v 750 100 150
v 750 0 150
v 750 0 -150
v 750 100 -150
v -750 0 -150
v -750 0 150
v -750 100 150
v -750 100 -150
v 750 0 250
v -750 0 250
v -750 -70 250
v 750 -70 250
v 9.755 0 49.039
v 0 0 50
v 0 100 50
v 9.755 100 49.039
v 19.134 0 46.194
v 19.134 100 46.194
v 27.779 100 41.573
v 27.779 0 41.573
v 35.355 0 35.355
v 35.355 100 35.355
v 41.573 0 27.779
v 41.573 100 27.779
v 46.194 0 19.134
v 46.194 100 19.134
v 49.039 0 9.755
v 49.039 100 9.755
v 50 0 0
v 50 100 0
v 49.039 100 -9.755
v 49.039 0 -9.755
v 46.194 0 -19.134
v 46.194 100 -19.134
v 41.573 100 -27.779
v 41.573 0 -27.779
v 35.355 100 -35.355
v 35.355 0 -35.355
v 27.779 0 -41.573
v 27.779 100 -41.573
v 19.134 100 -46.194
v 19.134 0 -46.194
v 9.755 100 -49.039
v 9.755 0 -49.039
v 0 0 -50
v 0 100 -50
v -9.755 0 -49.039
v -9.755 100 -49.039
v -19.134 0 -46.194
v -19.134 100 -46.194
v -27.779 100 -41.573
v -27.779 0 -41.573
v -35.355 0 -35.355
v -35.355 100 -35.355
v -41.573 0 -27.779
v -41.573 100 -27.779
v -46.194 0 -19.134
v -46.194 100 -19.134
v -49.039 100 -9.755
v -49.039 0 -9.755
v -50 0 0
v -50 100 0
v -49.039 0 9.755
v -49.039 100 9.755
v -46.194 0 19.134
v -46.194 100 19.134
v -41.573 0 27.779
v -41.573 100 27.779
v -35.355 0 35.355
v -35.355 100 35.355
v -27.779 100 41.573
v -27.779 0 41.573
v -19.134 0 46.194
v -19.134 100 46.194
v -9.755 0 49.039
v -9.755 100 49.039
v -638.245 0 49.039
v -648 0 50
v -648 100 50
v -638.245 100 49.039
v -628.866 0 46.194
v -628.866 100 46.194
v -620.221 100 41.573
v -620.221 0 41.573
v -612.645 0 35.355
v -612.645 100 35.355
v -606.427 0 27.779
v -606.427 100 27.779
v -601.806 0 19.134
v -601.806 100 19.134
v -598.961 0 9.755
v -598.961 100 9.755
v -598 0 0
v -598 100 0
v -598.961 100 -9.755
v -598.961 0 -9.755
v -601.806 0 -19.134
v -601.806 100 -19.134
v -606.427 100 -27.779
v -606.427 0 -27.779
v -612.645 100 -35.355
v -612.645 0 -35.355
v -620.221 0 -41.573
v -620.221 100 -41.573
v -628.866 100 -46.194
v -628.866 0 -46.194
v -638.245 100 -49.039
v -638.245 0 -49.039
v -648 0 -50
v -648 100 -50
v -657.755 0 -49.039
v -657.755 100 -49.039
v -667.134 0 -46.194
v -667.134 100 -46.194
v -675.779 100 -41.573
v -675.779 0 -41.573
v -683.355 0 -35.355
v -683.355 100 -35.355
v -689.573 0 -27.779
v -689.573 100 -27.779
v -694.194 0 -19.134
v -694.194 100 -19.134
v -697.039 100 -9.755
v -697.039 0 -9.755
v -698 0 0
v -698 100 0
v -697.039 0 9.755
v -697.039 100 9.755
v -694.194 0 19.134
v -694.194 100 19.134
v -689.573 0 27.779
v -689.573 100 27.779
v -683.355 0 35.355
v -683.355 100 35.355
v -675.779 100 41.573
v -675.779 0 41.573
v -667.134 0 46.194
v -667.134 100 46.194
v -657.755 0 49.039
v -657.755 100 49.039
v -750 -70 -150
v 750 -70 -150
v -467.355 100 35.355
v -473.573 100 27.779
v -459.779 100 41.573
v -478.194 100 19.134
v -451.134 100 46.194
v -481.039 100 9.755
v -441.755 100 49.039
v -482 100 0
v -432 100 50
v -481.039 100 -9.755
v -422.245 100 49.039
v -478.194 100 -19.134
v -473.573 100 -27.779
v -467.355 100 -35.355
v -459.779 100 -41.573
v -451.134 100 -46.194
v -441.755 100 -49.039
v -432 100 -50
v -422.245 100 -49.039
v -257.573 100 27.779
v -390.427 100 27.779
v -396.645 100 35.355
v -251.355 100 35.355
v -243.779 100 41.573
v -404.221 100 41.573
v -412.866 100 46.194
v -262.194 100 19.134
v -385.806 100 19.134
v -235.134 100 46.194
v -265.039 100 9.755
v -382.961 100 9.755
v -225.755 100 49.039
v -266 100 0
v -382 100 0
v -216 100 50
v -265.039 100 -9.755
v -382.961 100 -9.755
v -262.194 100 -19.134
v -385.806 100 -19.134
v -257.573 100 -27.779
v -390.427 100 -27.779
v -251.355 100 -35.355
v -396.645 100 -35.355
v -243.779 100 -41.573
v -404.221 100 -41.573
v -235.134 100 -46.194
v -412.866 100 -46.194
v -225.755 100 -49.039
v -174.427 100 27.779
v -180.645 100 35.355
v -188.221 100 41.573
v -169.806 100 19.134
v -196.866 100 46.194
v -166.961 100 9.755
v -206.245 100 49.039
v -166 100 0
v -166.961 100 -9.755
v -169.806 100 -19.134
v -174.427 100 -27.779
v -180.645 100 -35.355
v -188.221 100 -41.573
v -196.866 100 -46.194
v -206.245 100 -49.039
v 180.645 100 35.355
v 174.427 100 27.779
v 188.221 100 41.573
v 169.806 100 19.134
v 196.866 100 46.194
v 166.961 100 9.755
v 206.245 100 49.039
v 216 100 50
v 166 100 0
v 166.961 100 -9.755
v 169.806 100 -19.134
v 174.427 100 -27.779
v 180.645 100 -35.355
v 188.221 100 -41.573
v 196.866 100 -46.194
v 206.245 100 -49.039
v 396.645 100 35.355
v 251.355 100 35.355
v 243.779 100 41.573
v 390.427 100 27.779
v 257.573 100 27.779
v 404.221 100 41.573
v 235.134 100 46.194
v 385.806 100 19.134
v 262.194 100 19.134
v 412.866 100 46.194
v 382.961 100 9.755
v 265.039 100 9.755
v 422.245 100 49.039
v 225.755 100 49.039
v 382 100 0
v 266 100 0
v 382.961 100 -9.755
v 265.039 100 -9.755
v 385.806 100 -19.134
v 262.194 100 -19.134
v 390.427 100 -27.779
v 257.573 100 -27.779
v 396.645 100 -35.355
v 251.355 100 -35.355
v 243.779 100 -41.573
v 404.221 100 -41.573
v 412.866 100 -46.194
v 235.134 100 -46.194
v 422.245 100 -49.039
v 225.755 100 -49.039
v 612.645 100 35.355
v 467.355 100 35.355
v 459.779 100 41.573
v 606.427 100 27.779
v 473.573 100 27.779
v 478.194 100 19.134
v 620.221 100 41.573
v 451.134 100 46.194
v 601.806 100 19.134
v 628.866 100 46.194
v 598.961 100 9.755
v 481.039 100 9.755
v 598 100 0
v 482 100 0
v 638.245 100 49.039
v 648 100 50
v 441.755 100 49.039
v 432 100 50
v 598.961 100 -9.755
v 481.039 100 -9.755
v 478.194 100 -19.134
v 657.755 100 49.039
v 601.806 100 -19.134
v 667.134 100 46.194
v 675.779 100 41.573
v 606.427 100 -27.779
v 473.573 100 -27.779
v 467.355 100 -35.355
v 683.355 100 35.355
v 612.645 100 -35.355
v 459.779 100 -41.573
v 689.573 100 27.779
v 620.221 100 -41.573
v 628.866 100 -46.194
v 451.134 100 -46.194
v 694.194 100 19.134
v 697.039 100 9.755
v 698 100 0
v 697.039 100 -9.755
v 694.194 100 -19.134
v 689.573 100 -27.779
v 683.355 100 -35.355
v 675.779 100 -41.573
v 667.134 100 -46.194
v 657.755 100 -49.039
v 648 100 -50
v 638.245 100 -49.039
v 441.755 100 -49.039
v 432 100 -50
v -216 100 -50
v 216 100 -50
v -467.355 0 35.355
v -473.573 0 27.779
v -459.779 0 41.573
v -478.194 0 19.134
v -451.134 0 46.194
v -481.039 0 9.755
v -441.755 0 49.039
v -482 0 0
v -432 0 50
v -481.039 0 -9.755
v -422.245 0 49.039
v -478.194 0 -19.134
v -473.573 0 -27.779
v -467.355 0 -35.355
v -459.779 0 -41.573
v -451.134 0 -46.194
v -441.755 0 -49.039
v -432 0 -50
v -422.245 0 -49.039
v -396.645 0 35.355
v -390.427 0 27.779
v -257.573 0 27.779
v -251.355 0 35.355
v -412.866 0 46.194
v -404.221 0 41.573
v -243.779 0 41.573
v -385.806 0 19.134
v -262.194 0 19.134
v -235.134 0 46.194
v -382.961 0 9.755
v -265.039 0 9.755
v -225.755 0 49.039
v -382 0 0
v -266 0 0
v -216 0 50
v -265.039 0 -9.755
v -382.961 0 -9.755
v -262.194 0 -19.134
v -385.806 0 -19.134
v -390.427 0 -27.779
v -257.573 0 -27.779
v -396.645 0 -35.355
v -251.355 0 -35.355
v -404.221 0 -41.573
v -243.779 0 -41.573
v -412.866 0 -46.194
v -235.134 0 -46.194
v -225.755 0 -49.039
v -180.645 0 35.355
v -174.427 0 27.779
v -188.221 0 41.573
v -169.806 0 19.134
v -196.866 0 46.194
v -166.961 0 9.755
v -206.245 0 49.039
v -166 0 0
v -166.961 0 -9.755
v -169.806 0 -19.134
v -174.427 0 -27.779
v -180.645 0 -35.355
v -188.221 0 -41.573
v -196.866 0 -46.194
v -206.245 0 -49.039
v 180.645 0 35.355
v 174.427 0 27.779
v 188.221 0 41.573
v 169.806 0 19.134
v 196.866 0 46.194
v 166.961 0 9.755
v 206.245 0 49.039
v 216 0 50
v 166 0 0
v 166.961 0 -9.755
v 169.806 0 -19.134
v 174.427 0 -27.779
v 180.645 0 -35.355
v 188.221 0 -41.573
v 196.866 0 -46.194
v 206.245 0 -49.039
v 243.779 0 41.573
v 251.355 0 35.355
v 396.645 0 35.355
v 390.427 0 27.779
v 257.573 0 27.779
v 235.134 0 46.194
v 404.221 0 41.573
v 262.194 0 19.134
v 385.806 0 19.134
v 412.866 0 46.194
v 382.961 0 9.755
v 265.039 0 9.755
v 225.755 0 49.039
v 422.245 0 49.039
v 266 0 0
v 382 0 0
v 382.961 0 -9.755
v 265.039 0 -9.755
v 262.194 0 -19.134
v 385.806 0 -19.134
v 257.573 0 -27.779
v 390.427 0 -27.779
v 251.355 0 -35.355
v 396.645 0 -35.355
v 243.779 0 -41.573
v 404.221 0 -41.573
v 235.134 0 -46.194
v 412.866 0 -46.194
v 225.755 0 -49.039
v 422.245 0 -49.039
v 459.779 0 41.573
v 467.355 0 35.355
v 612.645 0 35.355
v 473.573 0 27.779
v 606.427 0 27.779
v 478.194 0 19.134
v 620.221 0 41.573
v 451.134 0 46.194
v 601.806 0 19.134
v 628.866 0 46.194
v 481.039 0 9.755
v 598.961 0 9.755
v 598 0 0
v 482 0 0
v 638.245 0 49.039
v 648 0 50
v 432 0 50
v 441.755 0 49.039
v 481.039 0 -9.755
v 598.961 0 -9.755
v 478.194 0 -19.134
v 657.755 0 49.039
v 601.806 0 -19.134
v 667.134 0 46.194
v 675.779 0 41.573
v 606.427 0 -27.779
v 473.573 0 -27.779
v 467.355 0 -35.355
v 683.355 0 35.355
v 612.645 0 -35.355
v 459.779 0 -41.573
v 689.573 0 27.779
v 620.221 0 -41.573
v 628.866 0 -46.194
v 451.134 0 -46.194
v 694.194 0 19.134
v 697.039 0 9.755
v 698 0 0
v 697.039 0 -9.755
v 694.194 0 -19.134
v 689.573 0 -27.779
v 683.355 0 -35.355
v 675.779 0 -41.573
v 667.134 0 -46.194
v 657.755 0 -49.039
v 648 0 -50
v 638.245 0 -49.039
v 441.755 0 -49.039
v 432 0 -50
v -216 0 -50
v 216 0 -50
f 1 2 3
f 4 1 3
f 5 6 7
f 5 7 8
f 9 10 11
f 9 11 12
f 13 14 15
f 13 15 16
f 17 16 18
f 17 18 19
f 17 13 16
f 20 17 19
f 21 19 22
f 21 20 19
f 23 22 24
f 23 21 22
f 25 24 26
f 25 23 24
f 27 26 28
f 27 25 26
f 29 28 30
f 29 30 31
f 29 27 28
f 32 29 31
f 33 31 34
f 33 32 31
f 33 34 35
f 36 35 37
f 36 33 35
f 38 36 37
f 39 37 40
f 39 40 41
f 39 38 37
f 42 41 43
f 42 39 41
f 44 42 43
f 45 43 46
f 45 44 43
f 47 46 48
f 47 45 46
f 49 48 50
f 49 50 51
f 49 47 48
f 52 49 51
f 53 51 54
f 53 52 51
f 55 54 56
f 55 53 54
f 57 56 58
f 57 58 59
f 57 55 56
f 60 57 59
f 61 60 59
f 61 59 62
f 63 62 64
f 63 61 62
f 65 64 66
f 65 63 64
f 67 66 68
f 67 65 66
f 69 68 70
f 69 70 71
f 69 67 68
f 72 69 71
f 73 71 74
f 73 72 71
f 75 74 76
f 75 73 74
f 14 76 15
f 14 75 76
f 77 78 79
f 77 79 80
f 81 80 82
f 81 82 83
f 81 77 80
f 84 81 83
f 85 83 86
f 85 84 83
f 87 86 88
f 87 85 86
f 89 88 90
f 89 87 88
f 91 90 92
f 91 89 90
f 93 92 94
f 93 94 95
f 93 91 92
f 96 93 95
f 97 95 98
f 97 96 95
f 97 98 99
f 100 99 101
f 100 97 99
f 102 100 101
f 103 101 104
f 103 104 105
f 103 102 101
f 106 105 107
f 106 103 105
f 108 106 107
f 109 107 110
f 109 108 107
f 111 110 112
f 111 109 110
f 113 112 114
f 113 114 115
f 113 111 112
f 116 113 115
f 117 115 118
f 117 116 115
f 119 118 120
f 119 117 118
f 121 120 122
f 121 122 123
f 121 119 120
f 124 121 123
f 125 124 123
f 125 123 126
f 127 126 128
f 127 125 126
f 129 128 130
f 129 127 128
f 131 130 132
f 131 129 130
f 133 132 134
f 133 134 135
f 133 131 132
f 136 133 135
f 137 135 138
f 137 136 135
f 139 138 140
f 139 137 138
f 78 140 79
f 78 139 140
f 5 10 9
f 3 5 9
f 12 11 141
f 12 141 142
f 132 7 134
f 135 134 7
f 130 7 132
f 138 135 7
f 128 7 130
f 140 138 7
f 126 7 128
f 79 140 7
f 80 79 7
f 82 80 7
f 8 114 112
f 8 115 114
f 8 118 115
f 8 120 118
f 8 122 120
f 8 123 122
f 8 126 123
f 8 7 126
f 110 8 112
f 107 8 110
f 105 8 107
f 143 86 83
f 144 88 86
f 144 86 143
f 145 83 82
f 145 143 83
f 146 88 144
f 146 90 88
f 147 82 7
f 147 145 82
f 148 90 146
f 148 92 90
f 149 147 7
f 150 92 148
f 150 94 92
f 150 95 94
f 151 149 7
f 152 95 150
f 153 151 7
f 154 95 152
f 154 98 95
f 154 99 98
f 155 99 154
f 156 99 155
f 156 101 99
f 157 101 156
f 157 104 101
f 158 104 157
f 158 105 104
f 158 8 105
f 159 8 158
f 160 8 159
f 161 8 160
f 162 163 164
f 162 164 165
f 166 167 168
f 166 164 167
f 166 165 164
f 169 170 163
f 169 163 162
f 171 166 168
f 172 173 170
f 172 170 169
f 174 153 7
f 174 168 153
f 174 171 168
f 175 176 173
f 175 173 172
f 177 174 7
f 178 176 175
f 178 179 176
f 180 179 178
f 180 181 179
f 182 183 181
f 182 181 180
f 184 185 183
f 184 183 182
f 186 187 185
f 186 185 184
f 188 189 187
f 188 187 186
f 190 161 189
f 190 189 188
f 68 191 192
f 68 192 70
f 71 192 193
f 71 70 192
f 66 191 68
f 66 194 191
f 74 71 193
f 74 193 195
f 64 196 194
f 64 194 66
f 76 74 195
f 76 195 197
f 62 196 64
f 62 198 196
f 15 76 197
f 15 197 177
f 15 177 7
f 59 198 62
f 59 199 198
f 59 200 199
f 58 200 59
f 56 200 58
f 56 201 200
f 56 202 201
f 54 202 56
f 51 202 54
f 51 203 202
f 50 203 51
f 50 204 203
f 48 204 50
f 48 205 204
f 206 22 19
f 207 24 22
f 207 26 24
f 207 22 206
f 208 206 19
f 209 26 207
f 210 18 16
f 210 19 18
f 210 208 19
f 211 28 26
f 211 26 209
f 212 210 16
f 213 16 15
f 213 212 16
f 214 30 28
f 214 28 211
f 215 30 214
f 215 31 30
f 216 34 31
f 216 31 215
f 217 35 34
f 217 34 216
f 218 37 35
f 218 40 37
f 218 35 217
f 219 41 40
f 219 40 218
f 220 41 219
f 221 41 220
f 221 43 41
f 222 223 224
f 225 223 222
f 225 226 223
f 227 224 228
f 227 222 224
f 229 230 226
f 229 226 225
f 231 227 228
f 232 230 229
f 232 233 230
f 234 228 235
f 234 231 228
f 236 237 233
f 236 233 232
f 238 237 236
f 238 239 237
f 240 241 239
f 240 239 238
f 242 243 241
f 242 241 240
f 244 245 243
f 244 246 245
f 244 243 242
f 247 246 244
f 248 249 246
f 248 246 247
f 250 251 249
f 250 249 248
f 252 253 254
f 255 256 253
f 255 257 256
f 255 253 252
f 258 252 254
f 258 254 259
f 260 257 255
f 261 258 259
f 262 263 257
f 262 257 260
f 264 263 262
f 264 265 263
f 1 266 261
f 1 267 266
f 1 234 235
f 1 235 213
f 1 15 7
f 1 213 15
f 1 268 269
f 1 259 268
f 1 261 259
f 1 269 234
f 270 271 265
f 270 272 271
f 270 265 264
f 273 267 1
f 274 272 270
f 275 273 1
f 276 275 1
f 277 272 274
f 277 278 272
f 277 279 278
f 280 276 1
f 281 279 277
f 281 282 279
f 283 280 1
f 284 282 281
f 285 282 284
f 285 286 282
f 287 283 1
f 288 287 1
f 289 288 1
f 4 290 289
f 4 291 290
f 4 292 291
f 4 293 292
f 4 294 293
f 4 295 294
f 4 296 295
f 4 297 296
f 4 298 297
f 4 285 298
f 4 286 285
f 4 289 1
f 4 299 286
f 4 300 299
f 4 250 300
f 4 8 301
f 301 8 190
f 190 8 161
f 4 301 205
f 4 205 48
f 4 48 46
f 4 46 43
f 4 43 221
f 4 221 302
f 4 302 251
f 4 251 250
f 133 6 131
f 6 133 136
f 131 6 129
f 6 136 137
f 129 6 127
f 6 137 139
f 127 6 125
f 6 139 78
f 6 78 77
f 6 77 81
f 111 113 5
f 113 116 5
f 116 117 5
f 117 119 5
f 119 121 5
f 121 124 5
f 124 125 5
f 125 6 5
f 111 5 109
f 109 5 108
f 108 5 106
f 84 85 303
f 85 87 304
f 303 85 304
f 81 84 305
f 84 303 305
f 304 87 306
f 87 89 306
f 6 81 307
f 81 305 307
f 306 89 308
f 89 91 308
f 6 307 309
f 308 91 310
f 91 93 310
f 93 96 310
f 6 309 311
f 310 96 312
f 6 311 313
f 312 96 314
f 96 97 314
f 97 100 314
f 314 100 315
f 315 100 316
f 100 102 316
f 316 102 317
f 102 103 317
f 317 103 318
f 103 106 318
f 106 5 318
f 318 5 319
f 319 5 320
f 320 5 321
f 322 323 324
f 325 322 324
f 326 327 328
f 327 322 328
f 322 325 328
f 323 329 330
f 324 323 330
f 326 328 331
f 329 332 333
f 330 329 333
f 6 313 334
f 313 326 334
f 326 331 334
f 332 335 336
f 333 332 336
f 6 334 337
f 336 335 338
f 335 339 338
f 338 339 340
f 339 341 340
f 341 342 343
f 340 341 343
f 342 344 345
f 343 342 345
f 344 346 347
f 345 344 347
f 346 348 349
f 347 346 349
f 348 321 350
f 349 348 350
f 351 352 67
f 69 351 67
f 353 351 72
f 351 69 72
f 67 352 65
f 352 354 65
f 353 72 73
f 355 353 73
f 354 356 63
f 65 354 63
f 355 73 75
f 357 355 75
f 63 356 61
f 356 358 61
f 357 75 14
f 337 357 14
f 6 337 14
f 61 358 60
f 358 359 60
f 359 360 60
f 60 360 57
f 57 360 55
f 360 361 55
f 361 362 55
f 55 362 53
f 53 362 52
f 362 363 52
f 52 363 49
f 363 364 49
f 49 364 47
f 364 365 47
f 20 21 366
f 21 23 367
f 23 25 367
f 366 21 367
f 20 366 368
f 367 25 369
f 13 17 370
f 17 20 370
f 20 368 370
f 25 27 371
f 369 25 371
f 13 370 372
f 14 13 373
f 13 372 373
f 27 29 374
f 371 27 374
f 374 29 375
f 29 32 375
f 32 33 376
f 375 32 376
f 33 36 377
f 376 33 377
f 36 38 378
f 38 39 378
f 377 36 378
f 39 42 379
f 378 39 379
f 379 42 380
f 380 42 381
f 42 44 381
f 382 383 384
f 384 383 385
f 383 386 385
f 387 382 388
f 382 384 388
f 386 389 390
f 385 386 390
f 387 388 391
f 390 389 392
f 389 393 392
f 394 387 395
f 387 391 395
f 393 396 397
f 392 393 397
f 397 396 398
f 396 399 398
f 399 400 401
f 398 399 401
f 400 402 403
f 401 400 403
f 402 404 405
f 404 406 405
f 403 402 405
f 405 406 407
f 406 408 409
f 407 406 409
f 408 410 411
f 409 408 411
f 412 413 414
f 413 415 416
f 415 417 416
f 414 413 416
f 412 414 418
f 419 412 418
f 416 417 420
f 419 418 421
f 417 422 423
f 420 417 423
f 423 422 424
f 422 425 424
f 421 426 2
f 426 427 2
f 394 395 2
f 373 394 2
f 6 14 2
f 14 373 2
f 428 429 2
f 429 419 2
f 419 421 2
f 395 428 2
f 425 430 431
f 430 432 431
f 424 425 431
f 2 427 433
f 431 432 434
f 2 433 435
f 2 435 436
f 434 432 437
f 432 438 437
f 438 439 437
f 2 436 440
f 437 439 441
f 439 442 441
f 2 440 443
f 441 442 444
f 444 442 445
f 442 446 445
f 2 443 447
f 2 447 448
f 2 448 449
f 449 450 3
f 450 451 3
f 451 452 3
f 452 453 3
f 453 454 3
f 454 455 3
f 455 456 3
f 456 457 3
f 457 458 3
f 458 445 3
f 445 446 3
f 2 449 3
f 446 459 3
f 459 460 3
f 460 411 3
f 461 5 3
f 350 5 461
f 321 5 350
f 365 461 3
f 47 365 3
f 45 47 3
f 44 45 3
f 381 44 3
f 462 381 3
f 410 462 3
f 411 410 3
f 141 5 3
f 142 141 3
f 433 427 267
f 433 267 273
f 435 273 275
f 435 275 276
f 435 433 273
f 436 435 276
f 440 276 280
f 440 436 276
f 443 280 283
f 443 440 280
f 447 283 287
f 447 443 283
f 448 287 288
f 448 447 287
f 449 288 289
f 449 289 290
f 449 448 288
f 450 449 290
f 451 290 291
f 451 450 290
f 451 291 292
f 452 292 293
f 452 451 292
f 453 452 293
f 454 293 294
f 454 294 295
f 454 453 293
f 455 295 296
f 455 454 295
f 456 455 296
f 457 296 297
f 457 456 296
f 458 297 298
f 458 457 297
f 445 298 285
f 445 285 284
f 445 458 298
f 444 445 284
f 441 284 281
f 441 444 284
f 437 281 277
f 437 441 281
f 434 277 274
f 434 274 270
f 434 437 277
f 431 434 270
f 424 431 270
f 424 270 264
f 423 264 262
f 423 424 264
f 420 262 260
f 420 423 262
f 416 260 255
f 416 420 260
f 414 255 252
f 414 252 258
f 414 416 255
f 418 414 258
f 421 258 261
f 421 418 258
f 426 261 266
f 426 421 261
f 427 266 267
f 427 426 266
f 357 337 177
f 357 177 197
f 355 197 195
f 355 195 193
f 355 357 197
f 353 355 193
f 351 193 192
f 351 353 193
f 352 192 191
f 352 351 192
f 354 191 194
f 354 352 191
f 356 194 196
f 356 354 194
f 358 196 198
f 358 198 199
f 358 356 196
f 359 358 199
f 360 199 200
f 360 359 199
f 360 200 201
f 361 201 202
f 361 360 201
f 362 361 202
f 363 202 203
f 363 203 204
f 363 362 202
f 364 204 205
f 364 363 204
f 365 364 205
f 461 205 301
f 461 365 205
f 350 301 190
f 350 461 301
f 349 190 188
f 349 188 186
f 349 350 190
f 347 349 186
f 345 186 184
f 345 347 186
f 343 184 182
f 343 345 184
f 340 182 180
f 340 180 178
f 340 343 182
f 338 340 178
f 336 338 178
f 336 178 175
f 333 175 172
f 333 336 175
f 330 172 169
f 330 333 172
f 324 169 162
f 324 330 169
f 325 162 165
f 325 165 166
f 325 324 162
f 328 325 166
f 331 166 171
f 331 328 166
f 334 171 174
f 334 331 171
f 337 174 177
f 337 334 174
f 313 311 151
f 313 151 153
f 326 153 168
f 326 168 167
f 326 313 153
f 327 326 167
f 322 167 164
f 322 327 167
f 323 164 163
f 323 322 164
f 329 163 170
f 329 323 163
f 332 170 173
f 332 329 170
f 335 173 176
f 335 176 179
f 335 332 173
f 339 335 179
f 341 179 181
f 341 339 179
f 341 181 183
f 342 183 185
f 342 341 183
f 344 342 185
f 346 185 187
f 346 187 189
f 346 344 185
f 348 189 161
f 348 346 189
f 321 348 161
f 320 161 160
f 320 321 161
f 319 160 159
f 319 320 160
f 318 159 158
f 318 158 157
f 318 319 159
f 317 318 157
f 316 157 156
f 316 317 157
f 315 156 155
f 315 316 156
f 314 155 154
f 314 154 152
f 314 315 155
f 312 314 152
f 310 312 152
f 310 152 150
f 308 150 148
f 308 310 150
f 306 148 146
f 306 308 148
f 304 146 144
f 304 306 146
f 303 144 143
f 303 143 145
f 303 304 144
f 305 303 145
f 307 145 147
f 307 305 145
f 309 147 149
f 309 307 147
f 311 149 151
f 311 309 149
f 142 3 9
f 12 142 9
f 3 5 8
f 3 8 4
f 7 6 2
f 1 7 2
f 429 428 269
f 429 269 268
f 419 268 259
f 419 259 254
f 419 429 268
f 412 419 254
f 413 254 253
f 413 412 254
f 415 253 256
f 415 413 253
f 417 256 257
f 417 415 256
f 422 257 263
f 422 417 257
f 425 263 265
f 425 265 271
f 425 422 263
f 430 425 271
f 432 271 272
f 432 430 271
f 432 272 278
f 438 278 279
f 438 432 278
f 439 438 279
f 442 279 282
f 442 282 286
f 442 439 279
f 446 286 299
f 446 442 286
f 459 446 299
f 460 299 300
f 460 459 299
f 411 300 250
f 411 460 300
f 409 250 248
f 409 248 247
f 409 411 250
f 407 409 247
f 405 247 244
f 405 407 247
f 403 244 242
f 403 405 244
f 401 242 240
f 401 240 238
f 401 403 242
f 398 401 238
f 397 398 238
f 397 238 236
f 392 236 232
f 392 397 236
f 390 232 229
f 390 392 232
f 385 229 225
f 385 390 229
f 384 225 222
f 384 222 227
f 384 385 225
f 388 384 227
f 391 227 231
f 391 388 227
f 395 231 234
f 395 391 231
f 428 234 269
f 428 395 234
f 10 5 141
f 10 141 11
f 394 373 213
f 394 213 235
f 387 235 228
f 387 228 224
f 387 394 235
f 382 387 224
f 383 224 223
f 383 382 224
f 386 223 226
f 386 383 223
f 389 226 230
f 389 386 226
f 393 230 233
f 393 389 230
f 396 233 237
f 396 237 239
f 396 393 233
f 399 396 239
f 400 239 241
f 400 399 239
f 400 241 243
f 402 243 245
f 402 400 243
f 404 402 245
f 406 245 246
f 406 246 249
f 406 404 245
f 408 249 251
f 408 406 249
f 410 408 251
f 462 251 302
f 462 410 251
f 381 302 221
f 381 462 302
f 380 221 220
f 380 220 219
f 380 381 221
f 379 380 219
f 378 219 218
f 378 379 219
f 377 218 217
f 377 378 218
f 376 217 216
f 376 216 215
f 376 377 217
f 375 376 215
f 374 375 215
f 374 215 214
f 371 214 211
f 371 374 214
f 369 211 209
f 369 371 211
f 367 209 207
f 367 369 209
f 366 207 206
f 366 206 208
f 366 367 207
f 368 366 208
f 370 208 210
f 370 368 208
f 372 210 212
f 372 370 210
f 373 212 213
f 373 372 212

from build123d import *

# Parameters (mm, degrees)
SKETCH1_W           = 1500
SKETCH1_H           = 300
SKETCH1_R           = 50
BOSS_EXTRUDE1_DEPTH = 100
SKETCH2_W           = 1500
SKETCH2_H           = 400
BOSS_EXTRUDE3_DEPTH = 70


with BuildPart() as part:
    # Sketch1 → Boss-Extrude1 (new body)
    with BuildSketch(Plane(origin=(0, 0, 0), x_dir=(1, 0, 0), z_dir=(0, 1, 0))):
        Rectangle(SKETCH1_W, SKETCH1_H)
        with Locations(Location((-648, 0, 0), (0, 0, 270))):
            Circle(SKETCH1_R, mode=Mode.SUBTRACT)
        with Locations(Location((-432, 0, 0), (0, 0, 270))):
            Circle(SKETCH1_R, mode=Mode.SUBTRACT)
        with Locations(Location((-216, 0, 0), (0, 0, 270))):
            Circle(SKETCH1_R, mode=Mode.SUBTRACT)
        with Locations(Location((0, 0, 0), (0, 0, 270))):
            Circle(SKETCH1_R, mode=Mode.SUBTRACT)
        with Locations(Location((216, 0, 0), (0, 0, 270))):
            Circle(SKETCH1_R, mode=Mode.SUBTRACT)
        with Locations(Location((432, 0, 0), (0, 0, 270))):
            Circle(SKETCH1_R, mode=Mode.SUBTRACT)
        with Locations(Location((648, 0, 0), (0, 0, 270))):
            Circle(SKETCH1_R, mode=Mode.SUBTRACT)
    extrude(amount=BOSS_EXTRUDE1_DEPTH)


with BuildPart() as body_2:
    # Sketch2 → Boss-Extrude3 (new body)
    with BuildSketch(Plane.XZ):
        with Locations((0, 50)):
            Rectangle(SKETCH2_W, SKETCH2_H)
    extrude(amount=BOSS_EXTRUDE3_DEPTH)


solid = Compound([part.part, body_2.part])
